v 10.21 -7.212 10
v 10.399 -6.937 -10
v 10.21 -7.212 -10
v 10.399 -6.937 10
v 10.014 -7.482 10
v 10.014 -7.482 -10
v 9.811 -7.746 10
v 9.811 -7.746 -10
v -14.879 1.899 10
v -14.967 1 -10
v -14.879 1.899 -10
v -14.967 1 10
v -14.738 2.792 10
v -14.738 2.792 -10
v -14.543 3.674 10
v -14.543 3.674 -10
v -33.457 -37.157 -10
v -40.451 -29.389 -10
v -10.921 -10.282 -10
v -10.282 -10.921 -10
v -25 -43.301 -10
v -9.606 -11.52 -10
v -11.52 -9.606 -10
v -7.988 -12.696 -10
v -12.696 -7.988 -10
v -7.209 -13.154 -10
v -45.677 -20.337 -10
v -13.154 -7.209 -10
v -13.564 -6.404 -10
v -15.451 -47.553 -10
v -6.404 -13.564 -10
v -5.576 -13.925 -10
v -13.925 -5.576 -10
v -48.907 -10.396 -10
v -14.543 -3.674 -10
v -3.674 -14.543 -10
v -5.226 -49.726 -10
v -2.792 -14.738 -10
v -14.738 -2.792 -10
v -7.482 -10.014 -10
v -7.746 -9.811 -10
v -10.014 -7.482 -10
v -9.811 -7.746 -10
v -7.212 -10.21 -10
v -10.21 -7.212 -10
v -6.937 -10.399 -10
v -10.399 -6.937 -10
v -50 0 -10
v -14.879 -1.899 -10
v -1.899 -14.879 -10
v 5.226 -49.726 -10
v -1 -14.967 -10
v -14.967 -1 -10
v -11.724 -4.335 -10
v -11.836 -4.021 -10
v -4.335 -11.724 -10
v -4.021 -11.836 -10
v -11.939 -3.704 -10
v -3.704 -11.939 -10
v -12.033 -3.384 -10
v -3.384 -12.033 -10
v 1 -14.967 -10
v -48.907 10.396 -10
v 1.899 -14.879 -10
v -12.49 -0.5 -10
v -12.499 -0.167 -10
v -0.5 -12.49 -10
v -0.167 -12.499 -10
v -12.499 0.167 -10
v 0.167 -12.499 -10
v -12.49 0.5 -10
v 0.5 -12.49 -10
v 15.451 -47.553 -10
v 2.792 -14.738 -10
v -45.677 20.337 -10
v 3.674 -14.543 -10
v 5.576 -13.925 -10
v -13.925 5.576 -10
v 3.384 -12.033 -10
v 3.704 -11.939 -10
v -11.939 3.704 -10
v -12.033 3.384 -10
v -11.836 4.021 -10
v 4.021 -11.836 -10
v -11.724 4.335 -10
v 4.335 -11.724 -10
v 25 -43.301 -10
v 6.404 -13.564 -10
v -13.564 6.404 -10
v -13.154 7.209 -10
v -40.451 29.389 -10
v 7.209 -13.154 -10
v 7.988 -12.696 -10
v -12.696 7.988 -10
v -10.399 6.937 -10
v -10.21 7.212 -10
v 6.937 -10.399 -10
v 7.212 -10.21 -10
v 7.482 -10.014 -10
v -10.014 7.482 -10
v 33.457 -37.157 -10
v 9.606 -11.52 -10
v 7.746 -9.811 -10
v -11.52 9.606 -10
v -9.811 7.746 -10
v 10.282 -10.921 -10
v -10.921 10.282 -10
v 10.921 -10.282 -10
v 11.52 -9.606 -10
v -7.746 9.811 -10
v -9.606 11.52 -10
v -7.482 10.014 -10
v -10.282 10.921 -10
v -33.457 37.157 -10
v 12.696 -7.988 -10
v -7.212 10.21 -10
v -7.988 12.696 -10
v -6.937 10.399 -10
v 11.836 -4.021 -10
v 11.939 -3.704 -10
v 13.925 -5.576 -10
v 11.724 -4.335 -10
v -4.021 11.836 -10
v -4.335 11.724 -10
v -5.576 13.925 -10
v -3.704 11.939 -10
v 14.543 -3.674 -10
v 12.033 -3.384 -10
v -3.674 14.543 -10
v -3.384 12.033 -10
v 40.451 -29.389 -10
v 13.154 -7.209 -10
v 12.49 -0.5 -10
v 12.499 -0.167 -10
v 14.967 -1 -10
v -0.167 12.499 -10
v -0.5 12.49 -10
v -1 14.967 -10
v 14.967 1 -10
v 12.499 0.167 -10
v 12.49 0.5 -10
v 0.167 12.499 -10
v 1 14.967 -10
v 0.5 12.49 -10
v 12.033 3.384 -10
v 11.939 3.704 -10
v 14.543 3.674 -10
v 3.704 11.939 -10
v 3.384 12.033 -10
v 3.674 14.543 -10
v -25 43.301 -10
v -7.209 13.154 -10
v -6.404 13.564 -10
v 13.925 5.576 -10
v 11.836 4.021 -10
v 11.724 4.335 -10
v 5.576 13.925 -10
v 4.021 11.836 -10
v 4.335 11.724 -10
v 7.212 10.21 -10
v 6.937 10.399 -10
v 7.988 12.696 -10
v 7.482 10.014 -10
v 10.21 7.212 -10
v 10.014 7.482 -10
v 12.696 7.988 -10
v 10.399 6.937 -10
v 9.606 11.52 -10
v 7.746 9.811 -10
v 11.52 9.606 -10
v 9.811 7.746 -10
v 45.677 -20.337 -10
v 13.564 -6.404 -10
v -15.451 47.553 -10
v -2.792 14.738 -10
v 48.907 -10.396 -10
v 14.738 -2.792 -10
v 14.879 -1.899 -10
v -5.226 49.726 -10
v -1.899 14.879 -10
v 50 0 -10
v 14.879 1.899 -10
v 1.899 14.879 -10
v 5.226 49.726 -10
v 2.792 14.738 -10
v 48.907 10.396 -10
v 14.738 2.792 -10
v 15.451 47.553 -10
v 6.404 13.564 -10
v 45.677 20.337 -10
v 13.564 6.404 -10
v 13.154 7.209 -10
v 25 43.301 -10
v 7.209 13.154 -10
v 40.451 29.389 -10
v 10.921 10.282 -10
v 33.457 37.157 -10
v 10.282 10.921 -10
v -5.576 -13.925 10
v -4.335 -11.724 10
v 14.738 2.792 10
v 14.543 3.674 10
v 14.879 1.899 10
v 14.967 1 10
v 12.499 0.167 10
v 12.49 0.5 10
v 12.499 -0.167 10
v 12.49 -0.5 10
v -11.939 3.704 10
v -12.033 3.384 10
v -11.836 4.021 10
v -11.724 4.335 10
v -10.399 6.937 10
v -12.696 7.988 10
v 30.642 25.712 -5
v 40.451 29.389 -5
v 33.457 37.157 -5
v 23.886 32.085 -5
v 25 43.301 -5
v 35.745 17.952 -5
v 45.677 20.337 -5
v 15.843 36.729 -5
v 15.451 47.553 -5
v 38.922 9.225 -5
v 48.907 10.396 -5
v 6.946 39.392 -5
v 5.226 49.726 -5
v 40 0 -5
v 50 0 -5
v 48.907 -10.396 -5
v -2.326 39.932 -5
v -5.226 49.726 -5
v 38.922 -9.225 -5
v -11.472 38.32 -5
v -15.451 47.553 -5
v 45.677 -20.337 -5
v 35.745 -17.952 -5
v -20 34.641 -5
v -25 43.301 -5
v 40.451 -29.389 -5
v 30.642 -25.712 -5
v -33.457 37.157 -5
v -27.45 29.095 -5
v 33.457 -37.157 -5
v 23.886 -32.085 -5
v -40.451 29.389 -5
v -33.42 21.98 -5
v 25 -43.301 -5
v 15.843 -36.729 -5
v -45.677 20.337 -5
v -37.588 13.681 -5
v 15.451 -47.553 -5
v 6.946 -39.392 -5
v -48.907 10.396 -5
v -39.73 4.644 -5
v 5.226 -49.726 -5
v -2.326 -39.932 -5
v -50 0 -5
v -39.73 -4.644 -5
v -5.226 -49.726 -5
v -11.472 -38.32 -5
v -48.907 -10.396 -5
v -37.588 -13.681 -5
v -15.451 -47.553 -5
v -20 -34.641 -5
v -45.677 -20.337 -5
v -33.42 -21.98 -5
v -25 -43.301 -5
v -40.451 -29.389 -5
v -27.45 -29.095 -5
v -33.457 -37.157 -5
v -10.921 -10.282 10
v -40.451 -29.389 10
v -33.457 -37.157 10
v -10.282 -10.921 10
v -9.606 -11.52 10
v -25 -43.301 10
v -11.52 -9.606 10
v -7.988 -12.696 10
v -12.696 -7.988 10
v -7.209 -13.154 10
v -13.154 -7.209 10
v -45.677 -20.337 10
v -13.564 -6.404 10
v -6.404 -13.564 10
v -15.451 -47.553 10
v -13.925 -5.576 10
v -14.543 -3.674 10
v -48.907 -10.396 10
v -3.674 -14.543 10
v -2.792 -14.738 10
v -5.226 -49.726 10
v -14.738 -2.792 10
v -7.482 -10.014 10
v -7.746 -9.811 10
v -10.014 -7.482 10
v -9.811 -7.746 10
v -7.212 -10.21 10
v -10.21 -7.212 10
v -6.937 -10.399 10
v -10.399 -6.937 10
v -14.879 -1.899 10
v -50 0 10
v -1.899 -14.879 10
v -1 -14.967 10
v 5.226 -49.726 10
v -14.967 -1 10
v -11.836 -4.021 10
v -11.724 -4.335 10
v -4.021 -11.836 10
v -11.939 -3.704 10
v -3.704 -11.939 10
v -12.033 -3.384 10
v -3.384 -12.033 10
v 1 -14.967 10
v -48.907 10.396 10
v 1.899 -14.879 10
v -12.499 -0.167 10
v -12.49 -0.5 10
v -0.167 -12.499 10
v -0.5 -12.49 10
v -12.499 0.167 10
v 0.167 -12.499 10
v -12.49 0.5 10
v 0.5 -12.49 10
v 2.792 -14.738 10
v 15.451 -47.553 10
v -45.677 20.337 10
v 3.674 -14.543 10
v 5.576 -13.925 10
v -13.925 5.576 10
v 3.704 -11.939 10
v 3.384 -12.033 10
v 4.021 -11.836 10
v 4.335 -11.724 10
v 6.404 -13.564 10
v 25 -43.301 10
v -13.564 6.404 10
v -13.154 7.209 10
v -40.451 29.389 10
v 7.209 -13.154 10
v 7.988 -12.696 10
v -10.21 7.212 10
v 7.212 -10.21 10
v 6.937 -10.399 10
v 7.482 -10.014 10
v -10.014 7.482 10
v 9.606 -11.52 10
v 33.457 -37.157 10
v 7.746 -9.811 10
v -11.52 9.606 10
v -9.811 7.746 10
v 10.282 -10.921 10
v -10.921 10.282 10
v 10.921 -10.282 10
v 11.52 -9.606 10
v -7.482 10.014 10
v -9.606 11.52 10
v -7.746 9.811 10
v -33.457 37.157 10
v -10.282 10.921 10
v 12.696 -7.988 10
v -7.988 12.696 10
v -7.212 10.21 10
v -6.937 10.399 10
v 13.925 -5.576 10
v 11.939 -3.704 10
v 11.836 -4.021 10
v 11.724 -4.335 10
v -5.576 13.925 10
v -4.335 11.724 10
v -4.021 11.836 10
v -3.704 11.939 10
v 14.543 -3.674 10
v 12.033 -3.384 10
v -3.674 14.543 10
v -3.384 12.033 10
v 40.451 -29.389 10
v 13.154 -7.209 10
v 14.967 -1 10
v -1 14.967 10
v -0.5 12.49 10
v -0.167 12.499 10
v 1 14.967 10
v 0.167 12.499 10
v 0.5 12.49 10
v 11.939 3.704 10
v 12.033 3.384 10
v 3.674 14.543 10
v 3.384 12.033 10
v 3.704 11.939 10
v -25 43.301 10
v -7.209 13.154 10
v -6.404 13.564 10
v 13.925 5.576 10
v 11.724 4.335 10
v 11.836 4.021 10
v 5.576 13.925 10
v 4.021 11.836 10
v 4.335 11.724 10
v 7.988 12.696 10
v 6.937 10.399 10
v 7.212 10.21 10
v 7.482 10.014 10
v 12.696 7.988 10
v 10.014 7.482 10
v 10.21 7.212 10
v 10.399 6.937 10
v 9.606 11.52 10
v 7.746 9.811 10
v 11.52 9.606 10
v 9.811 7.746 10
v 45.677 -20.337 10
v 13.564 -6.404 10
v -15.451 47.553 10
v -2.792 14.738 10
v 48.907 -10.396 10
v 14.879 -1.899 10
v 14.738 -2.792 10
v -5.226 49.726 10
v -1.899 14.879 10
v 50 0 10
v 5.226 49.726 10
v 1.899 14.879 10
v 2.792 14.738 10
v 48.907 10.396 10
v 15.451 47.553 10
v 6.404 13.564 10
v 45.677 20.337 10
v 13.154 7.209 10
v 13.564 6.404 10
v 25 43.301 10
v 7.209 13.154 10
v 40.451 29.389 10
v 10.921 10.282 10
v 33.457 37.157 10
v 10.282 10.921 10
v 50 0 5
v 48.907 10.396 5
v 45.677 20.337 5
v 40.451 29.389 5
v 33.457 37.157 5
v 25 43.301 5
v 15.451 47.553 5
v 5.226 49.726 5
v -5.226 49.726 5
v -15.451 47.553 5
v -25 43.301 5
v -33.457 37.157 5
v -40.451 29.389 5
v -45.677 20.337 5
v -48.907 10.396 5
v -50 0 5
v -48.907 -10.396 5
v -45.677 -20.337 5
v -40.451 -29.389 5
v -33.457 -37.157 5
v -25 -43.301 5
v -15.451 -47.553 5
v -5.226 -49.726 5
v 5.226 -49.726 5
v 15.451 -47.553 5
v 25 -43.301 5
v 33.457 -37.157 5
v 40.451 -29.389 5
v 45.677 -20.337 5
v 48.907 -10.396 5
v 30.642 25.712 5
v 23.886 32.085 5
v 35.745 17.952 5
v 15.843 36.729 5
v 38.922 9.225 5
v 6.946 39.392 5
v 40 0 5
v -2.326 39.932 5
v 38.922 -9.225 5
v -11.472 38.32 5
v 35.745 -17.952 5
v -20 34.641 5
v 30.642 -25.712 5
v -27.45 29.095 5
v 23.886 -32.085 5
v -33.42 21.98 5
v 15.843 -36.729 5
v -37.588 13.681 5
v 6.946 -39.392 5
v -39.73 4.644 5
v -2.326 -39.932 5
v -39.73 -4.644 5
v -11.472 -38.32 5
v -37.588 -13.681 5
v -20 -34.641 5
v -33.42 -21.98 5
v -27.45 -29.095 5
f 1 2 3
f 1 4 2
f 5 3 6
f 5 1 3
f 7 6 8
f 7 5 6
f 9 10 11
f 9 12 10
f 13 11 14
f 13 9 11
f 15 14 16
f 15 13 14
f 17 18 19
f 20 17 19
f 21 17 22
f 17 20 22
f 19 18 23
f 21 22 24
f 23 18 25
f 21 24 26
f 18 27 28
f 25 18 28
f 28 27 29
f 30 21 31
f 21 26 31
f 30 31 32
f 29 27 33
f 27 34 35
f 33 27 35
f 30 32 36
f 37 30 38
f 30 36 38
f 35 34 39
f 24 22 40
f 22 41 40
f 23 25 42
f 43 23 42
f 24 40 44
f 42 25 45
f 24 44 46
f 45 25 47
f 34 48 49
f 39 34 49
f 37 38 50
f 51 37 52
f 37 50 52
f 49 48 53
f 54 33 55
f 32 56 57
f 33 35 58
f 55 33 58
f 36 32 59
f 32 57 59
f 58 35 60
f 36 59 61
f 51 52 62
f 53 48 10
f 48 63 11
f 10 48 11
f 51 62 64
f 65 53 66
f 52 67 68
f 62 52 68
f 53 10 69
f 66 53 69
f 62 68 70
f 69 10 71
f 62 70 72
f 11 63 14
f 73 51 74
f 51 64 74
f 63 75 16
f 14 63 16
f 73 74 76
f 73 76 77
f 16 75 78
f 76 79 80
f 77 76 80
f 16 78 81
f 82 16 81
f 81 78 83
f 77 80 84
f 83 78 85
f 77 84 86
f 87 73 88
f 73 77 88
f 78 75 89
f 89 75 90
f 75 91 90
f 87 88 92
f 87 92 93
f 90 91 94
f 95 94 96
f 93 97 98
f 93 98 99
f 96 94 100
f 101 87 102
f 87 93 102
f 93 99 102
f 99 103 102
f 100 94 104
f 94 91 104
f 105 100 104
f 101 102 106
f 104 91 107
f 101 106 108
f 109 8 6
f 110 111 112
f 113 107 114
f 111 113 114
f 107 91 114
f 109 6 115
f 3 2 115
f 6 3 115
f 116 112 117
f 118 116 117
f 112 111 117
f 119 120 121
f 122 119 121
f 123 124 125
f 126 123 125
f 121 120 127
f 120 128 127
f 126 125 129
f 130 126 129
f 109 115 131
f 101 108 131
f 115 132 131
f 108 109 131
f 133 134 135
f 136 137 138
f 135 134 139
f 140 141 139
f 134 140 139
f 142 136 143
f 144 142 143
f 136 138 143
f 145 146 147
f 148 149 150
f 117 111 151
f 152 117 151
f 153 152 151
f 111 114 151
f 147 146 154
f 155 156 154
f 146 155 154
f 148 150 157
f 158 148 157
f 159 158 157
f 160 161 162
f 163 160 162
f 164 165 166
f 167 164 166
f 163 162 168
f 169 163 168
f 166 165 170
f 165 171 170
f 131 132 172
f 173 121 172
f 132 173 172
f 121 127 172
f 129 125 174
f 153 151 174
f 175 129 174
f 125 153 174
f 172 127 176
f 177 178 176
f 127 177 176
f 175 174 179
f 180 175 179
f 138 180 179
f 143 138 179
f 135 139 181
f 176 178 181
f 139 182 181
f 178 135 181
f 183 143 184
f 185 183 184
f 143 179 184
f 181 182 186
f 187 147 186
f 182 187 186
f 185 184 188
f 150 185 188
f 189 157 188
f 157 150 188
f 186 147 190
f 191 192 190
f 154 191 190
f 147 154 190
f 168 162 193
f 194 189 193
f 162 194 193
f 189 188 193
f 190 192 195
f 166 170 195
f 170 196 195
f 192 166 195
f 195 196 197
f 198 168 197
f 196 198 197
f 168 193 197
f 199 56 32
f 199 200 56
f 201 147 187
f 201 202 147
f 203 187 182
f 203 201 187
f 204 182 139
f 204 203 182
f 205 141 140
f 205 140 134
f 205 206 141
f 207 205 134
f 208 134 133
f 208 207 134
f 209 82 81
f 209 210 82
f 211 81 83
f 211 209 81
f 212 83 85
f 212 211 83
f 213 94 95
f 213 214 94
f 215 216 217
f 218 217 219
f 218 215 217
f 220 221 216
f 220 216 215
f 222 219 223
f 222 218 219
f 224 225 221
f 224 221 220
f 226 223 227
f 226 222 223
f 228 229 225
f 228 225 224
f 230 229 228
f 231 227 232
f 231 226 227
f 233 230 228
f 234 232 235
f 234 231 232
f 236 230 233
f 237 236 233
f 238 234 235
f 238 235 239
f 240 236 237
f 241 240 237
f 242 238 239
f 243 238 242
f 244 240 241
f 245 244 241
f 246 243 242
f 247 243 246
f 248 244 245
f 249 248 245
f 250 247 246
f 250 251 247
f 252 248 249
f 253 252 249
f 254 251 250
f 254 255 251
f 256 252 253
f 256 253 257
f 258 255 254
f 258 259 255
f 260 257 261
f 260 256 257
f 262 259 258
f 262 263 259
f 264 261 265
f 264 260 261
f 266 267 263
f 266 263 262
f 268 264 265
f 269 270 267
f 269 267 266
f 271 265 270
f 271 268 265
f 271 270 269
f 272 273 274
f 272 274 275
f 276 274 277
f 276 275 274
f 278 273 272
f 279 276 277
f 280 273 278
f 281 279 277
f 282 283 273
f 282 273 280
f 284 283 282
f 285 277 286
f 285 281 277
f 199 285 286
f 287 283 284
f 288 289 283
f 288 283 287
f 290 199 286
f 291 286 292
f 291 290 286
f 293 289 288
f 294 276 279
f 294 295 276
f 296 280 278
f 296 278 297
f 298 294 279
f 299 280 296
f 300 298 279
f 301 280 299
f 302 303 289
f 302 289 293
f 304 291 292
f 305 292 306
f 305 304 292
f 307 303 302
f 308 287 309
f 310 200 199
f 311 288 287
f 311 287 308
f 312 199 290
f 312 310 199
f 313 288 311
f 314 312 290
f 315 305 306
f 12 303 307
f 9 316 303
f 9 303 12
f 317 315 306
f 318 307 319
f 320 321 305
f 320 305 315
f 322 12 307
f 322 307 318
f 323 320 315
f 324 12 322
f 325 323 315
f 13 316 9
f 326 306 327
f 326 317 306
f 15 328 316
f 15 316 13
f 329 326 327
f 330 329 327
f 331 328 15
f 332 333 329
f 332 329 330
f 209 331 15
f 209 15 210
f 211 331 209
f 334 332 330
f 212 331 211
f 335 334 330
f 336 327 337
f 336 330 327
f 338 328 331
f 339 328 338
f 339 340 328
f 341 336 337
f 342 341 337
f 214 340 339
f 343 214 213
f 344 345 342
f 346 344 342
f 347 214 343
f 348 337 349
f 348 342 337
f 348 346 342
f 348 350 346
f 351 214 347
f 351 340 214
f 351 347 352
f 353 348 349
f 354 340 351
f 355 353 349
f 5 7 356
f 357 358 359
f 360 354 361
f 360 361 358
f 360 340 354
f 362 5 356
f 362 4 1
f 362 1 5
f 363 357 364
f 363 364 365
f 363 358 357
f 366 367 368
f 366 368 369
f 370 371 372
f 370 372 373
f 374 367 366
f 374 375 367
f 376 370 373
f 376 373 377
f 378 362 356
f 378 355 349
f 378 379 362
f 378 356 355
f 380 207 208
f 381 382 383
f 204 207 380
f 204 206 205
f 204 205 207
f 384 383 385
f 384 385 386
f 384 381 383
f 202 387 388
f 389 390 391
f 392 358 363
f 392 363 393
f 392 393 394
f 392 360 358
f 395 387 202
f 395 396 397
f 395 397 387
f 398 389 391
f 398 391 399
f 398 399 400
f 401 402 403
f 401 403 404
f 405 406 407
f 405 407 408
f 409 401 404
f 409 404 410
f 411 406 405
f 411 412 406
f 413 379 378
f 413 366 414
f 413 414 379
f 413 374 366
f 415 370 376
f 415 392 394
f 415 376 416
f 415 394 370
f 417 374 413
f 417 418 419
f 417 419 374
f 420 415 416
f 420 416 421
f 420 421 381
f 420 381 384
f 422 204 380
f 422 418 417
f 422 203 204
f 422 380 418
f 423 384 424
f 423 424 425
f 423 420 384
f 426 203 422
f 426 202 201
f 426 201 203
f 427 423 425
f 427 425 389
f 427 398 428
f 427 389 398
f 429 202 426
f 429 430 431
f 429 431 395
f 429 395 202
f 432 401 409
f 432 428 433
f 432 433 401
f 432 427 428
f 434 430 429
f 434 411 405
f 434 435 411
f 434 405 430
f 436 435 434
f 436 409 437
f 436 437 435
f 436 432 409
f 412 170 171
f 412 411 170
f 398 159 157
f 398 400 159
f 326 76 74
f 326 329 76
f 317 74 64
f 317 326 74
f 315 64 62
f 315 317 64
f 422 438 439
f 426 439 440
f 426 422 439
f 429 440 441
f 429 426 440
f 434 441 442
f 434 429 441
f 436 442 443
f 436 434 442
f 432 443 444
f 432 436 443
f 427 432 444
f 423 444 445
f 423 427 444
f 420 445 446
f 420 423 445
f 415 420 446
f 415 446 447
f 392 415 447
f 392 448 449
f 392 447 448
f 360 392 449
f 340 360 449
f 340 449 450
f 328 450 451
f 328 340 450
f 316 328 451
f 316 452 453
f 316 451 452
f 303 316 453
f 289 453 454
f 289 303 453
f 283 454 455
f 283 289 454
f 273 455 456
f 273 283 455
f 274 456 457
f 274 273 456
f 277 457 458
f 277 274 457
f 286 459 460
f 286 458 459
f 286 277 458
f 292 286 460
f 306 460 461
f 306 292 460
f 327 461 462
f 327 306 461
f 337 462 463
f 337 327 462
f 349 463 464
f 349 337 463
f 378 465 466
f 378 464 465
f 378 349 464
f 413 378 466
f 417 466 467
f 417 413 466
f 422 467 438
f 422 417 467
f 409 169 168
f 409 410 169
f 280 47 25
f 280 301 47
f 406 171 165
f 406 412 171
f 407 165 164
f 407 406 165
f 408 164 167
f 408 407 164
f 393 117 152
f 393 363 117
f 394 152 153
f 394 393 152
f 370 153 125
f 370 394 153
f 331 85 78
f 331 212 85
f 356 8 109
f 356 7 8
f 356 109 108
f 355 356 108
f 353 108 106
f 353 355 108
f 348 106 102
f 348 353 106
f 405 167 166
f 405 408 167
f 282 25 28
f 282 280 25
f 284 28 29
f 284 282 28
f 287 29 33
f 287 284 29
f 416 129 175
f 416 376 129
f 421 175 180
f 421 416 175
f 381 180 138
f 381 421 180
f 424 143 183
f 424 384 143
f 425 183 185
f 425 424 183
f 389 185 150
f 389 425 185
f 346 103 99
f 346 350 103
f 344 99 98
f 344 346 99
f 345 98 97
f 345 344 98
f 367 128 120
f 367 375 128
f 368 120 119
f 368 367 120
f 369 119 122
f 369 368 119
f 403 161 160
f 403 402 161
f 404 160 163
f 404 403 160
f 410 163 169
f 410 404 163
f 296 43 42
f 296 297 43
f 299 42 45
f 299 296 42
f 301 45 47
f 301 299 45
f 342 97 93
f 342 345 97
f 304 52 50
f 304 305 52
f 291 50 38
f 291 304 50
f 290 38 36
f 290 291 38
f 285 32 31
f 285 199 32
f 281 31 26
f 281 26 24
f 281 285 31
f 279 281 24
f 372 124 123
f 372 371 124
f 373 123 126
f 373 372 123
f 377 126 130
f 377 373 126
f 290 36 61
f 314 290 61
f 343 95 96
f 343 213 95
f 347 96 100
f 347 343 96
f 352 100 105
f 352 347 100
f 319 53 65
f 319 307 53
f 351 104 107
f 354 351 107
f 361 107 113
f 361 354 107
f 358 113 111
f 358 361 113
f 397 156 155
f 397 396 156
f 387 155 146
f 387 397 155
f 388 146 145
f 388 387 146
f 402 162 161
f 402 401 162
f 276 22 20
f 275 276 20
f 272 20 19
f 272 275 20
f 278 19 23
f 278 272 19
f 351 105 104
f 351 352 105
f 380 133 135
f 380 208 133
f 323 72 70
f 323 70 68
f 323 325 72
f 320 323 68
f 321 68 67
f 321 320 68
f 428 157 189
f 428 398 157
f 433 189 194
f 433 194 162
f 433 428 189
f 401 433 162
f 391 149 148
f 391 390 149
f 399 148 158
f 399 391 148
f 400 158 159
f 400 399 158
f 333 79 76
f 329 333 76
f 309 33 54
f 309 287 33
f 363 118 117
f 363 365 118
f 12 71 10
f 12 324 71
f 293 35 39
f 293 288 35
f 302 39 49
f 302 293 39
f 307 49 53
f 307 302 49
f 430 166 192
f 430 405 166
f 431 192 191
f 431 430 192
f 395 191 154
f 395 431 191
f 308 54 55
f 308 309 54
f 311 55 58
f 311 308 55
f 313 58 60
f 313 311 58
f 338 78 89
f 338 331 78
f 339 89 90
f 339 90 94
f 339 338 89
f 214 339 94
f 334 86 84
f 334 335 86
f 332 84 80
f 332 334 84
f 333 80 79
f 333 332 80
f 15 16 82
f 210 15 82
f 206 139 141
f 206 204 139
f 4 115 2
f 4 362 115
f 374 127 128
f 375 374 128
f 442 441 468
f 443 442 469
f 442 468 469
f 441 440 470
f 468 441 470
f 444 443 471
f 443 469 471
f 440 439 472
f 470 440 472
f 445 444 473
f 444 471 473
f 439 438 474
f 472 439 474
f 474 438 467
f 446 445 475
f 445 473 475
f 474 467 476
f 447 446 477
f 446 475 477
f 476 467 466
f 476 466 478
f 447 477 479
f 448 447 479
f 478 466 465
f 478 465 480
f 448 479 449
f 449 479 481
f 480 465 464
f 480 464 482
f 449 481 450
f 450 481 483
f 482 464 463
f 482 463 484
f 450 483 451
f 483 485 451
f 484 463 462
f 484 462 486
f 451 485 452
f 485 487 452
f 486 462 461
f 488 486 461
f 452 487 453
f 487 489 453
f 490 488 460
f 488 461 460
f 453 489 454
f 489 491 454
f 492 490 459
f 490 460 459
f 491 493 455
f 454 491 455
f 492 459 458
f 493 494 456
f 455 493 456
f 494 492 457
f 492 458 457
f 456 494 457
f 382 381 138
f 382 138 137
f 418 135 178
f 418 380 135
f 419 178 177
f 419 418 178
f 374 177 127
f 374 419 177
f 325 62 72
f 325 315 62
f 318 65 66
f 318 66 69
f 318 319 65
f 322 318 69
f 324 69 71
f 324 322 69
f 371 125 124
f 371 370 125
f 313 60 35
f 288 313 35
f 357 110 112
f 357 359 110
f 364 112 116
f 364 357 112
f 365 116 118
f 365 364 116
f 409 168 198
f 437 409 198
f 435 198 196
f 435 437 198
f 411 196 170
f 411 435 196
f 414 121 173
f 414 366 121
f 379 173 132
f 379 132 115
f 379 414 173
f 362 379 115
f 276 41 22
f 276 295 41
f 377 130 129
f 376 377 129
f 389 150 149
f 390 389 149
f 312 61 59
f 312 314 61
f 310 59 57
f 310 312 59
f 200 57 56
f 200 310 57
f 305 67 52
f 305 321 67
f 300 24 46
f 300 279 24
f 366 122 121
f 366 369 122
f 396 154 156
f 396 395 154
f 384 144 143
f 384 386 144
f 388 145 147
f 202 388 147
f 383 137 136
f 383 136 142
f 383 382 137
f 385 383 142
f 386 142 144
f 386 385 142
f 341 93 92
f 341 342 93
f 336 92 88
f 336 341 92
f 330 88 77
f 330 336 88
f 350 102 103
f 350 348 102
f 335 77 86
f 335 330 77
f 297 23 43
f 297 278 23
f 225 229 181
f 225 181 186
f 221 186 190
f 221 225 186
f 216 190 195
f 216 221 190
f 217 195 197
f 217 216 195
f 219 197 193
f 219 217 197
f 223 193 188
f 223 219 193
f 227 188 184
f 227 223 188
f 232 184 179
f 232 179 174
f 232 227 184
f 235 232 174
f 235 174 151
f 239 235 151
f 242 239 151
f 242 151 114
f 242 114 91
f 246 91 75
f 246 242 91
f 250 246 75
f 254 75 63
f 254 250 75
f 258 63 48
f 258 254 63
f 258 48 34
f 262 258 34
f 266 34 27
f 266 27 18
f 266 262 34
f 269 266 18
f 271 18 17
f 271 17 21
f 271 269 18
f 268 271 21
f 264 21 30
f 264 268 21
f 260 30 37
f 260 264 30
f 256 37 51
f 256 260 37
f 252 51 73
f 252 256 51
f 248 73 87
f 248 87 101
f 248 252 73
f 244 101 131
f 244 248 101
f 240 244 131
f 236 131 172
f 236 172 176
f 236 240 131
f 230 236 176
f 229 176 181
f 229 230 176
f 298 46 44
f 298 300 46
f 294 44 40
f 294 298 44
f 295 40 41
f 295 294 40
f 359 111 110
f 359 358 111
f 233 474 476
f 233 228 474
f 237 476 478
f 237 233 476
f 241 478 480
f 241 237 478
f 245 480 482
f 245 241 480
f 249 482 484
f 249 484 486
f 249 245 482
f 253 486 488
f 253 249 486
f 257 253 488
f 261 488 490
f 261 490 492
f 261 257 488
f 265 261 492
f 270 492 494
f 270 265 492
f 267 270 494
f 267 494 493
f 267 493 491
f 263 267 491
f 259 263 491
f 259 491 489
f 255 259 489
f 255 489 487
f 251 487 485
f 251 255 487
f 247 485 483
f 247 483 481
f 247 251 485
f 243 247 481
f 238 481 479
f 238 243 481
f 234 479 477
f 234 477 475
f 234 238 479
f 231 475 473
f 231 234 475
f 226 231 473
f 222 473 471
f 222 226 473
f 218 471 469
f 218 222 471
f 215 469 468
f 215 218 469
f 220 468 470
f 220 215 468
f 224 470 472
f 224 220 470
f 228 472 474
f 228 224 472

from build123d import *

# Parameters (mm, degrees)
SKETCH1_R           = 50
BOSS_EXTRUDE1_DEPTH = 10
SKETCH2_W           = 10
SKETCH2_H           = 10


with BuildPart() as part:
    # Sketch1 → Boss-Extrude1 (new, symmetric)
    with BuildSketch(Plane.XY):
        Circle(SKETCH1_R)
        with BuildLine():
            Line((-1, 14.966629547), (-0.5, 12.489995997))
            ThreePointArc((-0.5, 12.489995997), (0, 12.5), (0.5, 12.489995997))
            Line((0.5, 12.489995997), (1, 14.966629547))
            ThreePointArc((1, 14.966629547), (2.346516976, 14.815325109), (3.673886362, 14.543127552))
            Line((3.673886362, 14.543127552), (3.384092765, 12.033200578))
            ThreePointArc((3.384092765, 12.033200578), (3.86271243, 11.888206454), (4.335149281, 11.724183584))
            Line((4.335149281, 11.724183584), (5.575999395, 13.925093563))
            ThreePointArc((5.575999395, 13.925093563), (6.809857496, 13.365097863), (7.98814713, 12.696042904))
            Line((7.98814713, 12.696042904), (6.936926951, 10.398511647))
            ThreePointArc((6.936926951, 10.398511647), (7.347315654, 10.11271243), (7.745943945, 9.810726395))
            Line((7.745943945, 9.810726395), (9.606181119, 11.5204724))
            ThreePointArc((9.606181119, 11.5204724), (10.606601718, 10.606601718), (11.5204724, 9.606181119))
            Line((11.5204724, 9.606181119), (9.810726395, 7.745943945))
            ThreePointArc((9.810726395, 7.745943945), (10.11271243, 7.347315654), (10.398511647, 6.936926951))
            Line((10.398511647, 6.936926951), (12.696042904, 7.98814713))
            ThreePointArc((12.696042904, 7.98814713), (13.365097863, 6.809857496), (13.925093563, 5.575999395))
            Line((13.925093563, 5.575999395), (11.724183584, 4.335149281))
            ThreePointArc((11.724183584, 4.335149281), (11.888206454, 3.86271243), (12.033200578, 3.384092765))
            Line((12.033200578, 3.384092765), (14.543127552, 3.673886362))
            ThreePointArc((14.543127552, 3.673886362), (14.815325109, 2.346516976), (14.966629547, 1))
            Line((14.966629547, 1), (12.489995997, 0.5))
            ThreePointArc((12.489995997, 0.5), (12.5, 0), (12.489995997, -0.5))
            Line((12.489995997, -0.5), (14.966629547, -1))
            ThreePointArc((14.966629547, -1), (14.815325109, -2.346516976), (14.543127552, -3.673886362))
            Line((14.543127552, -3.673886362), (12.033200578, -3.384092765))
            ThreePointArc((12.033200578, -3.384092765), (11.888206454, -3.86271243), (11.724183584, -4.335149281))
            Line((11.724183584, -4.335149281), (13.925093563, -5.575999395))
            ThreePointArc((13.925093563, -5.575999395), (13.365097863, -6.809857496), (12.696042904, -7.98814713))
            Line((12.696042904, -7.98814713), (10.398511647, -6.936926951))
            ThreePointArc((10.398511647, -6.936926951), (10.11271243, -7.347315654), (9.810726395, -7.745943945))
            Line((9.810726395, -7.745943945), (11.5204724, -9.606181119))
            ThreePointArc((11.5204724, -9.606181119), (10.606601718, -10.606601718), (9.606181119, -11.5204724))
            Line((9.606181119, -11.5204724), (7.745943945, -9.810726395))
            ThreePointArc((7.745943945, -9.810726395), (7.347315654, -10.11271243), (6.936926951, -10.398511647))
            Line((6.936926951, -10.398511647), (7.98814713, -12.696042904))
            ThreePointArc((7.98814713, -12.696042904), (6.809857496, -13.365097863), (5.575999395, -13.925093563))
            Line((5.575999395, -13.925093563), (4.335149281, -11.724183584))
            ThreePointArc((4.335149281, -11.724183584), (3.86271243, -11.888206454), (3.384092765, -12.033200578))
            Line((3.384092765, -12.033200578), (3.673886362, -14.543127552))
            ThreePointArc((3.673886362, -14.543127552), (2.346516976, -14.815325109), (1, -14.966629547))
            Line((1, -14.966629547), (0.5, -12.489995997))
            ThreePointArc((0.5, -12.489995997), (0, -12.5), (-0.5, -12.489995997))
            Line((-0.5, -12.489995997), (-1, -14.966629547))
            ThreePointArc((-1, -14.966629547), (-2.346516976, -14.815325109), (-3.673886362, -14.543127552))
            Line((-3.673886362, -14.543127552), (-3.384092765, -12.033200578))
            ThreePointArc((-3.384092765, -12.033200578), (-3.86271243, -11.888206454), (-4.335149281, -11.724183584))
            Line((-4.335149281, -11.724183584), (-5.575999395, -13.925093563))
            ThreePointArc((-5.575999395, -13.925093563), (-6.809857496, -13.365097863), (-7.98814713, -12.696042904))
            Line((-7.98814713, -12.696042904), (-6.936926951, -10.398511647))
            ThreePointArc((-6.936926951, -10.398511647), (-7.347315654, -10.11271243), (-7.745943945, -9.810726395))
            Line((-7.745943945, -9.810726395), (-9.606181119, -11.5204724))
            ThreePointArc((-9.606181119, -11.5204724), (-10.606601718, -10.606601718), (-11.5204724, -9.606181119))
            Line((-11.5204724, -9.606181119), (-9.810726395, -7.745943945))
            ThreePointArc((-9.810726395, -7.745943945), (-10.11271243, -7.347315654), (-10.398511647, -6.936926951))
            Line((-10.398511647, -6.936926951), (-12.696042904, -7.98814713))
            ThreePointArc((-12.696042904, -7.98814713), (-13.365097863, -6.809857496), (-13.925093563, -5.575999395))
            Line((-13.925093563, -5.575999395), (-11.724183584, -4.335149281))
            ThreePointArc((-11.724183584, -4.335149281), (-11.888206454, -3.86271243), (-12.033200578, -3.384092765))
            Line((-12.033200578, -3.384092765), (-14.543127552, -3.673886362))
            ThreePointArc((-14.543127552, -3.673886362), (-14.815325109, -2.346516976), (-14.966629547, -1))
            Line((-14.966629547, -1), (-12.489995997, -0.5))
            ThreePointArc((-12.489995997, -0.5), (-12.5, 0), (-12.489995997, 0.5))
            Line((-12.489995997, 0.5), (-14.966629547, 1))
            ThreePointArc((-14.966629547, 1), (-14.815325109, 2.346516976), (-14.543127552, 3.673886362))
            Line((-14.543127552, 3.673886362), (-12.033200578, 3.384092765))
            ThreePointArc((-12.033200578, 3.384092765), (-11.888206454, 3.86271243), (-11.724183584, 4.335149281))
            Line((-11.724183584, 4.335149281), (-13.925093563, 5.575999395))
            ThreePointArc((-13.925093563, 5.575999395), (-13.365097863, 6.809857496), (-12.696042904, 7.98814713))
            Line((-12.696042904, 7.98814713), (-10.398511647, 6.936926951))
            ThreePointArc((-10.398511647, 6.936926951), (-10.11271243, 7.347315654), (-9.810726395, 7.745943945))
            Line((-9.810726395, 7.745943945), (-11.5204724, 9.606181119))
            ThreePointArc((-11.5204724, 9.606181119), (-10.606601718, 10.606601718), (-9.606181119, 11.5204724))
            Line((-9.606181119, 11.5204724), (-7.745943945, 9.810726395))
            ThreePointArc((-7.745943945, 9.810726395), (-7.347315654, 10.11271243), (-6.936926951, 10.398511647))
            Line((-6.936926951, 10.398511647), (-7.98814713, 12.696042904))
            ThreePointArc((-7.98814713, 12.696042904), (-6.809857496, 13.365097863), (-5.575999395, 13.925093563))
            Line((-5.575999395, 13.925093563), (-4.335149281, 11.724183584))
            ThreePointArc((-4.335149281, 11.724183584), (-3.86271243, 11.888206454), (-3.384092765, 12.033200578))
            Line((-3.384092765, 12.033200578), (-3.673886362, 14.543127552))
            ThreePointArc((-3.673886362, 14.543127552), (-2.346516976, 14.815325109), (-1, 14.966629547))
        make_face(mode=Mode.SUBTRACT)
    extrude(amount=BOSS_EXTRUDE1_DEPTH, both=True)

    # Sketch2 → Cut-Revolve1 (revolve, cut)
    with BuildSketch(Plane(origin=(0, 0, 0), x_dir=(0, 0, -1), z_dir=(1, 0, 0)), mode=Mode.PRIVATE) as cut_revolve1_sk:
        with Locations((0, 45)):
            Rectangle(SKETCH2_W, SKETCH2_H)
    revolve(cut_revolve1_sk.sketch.rotate(Axis((0, 0, 1000), (0, 0, -1)), 90), axis=Axis((0, 0, 1000), (0, 0, -1)), mode=Mode.SUBTRACT)


solid = part.part
